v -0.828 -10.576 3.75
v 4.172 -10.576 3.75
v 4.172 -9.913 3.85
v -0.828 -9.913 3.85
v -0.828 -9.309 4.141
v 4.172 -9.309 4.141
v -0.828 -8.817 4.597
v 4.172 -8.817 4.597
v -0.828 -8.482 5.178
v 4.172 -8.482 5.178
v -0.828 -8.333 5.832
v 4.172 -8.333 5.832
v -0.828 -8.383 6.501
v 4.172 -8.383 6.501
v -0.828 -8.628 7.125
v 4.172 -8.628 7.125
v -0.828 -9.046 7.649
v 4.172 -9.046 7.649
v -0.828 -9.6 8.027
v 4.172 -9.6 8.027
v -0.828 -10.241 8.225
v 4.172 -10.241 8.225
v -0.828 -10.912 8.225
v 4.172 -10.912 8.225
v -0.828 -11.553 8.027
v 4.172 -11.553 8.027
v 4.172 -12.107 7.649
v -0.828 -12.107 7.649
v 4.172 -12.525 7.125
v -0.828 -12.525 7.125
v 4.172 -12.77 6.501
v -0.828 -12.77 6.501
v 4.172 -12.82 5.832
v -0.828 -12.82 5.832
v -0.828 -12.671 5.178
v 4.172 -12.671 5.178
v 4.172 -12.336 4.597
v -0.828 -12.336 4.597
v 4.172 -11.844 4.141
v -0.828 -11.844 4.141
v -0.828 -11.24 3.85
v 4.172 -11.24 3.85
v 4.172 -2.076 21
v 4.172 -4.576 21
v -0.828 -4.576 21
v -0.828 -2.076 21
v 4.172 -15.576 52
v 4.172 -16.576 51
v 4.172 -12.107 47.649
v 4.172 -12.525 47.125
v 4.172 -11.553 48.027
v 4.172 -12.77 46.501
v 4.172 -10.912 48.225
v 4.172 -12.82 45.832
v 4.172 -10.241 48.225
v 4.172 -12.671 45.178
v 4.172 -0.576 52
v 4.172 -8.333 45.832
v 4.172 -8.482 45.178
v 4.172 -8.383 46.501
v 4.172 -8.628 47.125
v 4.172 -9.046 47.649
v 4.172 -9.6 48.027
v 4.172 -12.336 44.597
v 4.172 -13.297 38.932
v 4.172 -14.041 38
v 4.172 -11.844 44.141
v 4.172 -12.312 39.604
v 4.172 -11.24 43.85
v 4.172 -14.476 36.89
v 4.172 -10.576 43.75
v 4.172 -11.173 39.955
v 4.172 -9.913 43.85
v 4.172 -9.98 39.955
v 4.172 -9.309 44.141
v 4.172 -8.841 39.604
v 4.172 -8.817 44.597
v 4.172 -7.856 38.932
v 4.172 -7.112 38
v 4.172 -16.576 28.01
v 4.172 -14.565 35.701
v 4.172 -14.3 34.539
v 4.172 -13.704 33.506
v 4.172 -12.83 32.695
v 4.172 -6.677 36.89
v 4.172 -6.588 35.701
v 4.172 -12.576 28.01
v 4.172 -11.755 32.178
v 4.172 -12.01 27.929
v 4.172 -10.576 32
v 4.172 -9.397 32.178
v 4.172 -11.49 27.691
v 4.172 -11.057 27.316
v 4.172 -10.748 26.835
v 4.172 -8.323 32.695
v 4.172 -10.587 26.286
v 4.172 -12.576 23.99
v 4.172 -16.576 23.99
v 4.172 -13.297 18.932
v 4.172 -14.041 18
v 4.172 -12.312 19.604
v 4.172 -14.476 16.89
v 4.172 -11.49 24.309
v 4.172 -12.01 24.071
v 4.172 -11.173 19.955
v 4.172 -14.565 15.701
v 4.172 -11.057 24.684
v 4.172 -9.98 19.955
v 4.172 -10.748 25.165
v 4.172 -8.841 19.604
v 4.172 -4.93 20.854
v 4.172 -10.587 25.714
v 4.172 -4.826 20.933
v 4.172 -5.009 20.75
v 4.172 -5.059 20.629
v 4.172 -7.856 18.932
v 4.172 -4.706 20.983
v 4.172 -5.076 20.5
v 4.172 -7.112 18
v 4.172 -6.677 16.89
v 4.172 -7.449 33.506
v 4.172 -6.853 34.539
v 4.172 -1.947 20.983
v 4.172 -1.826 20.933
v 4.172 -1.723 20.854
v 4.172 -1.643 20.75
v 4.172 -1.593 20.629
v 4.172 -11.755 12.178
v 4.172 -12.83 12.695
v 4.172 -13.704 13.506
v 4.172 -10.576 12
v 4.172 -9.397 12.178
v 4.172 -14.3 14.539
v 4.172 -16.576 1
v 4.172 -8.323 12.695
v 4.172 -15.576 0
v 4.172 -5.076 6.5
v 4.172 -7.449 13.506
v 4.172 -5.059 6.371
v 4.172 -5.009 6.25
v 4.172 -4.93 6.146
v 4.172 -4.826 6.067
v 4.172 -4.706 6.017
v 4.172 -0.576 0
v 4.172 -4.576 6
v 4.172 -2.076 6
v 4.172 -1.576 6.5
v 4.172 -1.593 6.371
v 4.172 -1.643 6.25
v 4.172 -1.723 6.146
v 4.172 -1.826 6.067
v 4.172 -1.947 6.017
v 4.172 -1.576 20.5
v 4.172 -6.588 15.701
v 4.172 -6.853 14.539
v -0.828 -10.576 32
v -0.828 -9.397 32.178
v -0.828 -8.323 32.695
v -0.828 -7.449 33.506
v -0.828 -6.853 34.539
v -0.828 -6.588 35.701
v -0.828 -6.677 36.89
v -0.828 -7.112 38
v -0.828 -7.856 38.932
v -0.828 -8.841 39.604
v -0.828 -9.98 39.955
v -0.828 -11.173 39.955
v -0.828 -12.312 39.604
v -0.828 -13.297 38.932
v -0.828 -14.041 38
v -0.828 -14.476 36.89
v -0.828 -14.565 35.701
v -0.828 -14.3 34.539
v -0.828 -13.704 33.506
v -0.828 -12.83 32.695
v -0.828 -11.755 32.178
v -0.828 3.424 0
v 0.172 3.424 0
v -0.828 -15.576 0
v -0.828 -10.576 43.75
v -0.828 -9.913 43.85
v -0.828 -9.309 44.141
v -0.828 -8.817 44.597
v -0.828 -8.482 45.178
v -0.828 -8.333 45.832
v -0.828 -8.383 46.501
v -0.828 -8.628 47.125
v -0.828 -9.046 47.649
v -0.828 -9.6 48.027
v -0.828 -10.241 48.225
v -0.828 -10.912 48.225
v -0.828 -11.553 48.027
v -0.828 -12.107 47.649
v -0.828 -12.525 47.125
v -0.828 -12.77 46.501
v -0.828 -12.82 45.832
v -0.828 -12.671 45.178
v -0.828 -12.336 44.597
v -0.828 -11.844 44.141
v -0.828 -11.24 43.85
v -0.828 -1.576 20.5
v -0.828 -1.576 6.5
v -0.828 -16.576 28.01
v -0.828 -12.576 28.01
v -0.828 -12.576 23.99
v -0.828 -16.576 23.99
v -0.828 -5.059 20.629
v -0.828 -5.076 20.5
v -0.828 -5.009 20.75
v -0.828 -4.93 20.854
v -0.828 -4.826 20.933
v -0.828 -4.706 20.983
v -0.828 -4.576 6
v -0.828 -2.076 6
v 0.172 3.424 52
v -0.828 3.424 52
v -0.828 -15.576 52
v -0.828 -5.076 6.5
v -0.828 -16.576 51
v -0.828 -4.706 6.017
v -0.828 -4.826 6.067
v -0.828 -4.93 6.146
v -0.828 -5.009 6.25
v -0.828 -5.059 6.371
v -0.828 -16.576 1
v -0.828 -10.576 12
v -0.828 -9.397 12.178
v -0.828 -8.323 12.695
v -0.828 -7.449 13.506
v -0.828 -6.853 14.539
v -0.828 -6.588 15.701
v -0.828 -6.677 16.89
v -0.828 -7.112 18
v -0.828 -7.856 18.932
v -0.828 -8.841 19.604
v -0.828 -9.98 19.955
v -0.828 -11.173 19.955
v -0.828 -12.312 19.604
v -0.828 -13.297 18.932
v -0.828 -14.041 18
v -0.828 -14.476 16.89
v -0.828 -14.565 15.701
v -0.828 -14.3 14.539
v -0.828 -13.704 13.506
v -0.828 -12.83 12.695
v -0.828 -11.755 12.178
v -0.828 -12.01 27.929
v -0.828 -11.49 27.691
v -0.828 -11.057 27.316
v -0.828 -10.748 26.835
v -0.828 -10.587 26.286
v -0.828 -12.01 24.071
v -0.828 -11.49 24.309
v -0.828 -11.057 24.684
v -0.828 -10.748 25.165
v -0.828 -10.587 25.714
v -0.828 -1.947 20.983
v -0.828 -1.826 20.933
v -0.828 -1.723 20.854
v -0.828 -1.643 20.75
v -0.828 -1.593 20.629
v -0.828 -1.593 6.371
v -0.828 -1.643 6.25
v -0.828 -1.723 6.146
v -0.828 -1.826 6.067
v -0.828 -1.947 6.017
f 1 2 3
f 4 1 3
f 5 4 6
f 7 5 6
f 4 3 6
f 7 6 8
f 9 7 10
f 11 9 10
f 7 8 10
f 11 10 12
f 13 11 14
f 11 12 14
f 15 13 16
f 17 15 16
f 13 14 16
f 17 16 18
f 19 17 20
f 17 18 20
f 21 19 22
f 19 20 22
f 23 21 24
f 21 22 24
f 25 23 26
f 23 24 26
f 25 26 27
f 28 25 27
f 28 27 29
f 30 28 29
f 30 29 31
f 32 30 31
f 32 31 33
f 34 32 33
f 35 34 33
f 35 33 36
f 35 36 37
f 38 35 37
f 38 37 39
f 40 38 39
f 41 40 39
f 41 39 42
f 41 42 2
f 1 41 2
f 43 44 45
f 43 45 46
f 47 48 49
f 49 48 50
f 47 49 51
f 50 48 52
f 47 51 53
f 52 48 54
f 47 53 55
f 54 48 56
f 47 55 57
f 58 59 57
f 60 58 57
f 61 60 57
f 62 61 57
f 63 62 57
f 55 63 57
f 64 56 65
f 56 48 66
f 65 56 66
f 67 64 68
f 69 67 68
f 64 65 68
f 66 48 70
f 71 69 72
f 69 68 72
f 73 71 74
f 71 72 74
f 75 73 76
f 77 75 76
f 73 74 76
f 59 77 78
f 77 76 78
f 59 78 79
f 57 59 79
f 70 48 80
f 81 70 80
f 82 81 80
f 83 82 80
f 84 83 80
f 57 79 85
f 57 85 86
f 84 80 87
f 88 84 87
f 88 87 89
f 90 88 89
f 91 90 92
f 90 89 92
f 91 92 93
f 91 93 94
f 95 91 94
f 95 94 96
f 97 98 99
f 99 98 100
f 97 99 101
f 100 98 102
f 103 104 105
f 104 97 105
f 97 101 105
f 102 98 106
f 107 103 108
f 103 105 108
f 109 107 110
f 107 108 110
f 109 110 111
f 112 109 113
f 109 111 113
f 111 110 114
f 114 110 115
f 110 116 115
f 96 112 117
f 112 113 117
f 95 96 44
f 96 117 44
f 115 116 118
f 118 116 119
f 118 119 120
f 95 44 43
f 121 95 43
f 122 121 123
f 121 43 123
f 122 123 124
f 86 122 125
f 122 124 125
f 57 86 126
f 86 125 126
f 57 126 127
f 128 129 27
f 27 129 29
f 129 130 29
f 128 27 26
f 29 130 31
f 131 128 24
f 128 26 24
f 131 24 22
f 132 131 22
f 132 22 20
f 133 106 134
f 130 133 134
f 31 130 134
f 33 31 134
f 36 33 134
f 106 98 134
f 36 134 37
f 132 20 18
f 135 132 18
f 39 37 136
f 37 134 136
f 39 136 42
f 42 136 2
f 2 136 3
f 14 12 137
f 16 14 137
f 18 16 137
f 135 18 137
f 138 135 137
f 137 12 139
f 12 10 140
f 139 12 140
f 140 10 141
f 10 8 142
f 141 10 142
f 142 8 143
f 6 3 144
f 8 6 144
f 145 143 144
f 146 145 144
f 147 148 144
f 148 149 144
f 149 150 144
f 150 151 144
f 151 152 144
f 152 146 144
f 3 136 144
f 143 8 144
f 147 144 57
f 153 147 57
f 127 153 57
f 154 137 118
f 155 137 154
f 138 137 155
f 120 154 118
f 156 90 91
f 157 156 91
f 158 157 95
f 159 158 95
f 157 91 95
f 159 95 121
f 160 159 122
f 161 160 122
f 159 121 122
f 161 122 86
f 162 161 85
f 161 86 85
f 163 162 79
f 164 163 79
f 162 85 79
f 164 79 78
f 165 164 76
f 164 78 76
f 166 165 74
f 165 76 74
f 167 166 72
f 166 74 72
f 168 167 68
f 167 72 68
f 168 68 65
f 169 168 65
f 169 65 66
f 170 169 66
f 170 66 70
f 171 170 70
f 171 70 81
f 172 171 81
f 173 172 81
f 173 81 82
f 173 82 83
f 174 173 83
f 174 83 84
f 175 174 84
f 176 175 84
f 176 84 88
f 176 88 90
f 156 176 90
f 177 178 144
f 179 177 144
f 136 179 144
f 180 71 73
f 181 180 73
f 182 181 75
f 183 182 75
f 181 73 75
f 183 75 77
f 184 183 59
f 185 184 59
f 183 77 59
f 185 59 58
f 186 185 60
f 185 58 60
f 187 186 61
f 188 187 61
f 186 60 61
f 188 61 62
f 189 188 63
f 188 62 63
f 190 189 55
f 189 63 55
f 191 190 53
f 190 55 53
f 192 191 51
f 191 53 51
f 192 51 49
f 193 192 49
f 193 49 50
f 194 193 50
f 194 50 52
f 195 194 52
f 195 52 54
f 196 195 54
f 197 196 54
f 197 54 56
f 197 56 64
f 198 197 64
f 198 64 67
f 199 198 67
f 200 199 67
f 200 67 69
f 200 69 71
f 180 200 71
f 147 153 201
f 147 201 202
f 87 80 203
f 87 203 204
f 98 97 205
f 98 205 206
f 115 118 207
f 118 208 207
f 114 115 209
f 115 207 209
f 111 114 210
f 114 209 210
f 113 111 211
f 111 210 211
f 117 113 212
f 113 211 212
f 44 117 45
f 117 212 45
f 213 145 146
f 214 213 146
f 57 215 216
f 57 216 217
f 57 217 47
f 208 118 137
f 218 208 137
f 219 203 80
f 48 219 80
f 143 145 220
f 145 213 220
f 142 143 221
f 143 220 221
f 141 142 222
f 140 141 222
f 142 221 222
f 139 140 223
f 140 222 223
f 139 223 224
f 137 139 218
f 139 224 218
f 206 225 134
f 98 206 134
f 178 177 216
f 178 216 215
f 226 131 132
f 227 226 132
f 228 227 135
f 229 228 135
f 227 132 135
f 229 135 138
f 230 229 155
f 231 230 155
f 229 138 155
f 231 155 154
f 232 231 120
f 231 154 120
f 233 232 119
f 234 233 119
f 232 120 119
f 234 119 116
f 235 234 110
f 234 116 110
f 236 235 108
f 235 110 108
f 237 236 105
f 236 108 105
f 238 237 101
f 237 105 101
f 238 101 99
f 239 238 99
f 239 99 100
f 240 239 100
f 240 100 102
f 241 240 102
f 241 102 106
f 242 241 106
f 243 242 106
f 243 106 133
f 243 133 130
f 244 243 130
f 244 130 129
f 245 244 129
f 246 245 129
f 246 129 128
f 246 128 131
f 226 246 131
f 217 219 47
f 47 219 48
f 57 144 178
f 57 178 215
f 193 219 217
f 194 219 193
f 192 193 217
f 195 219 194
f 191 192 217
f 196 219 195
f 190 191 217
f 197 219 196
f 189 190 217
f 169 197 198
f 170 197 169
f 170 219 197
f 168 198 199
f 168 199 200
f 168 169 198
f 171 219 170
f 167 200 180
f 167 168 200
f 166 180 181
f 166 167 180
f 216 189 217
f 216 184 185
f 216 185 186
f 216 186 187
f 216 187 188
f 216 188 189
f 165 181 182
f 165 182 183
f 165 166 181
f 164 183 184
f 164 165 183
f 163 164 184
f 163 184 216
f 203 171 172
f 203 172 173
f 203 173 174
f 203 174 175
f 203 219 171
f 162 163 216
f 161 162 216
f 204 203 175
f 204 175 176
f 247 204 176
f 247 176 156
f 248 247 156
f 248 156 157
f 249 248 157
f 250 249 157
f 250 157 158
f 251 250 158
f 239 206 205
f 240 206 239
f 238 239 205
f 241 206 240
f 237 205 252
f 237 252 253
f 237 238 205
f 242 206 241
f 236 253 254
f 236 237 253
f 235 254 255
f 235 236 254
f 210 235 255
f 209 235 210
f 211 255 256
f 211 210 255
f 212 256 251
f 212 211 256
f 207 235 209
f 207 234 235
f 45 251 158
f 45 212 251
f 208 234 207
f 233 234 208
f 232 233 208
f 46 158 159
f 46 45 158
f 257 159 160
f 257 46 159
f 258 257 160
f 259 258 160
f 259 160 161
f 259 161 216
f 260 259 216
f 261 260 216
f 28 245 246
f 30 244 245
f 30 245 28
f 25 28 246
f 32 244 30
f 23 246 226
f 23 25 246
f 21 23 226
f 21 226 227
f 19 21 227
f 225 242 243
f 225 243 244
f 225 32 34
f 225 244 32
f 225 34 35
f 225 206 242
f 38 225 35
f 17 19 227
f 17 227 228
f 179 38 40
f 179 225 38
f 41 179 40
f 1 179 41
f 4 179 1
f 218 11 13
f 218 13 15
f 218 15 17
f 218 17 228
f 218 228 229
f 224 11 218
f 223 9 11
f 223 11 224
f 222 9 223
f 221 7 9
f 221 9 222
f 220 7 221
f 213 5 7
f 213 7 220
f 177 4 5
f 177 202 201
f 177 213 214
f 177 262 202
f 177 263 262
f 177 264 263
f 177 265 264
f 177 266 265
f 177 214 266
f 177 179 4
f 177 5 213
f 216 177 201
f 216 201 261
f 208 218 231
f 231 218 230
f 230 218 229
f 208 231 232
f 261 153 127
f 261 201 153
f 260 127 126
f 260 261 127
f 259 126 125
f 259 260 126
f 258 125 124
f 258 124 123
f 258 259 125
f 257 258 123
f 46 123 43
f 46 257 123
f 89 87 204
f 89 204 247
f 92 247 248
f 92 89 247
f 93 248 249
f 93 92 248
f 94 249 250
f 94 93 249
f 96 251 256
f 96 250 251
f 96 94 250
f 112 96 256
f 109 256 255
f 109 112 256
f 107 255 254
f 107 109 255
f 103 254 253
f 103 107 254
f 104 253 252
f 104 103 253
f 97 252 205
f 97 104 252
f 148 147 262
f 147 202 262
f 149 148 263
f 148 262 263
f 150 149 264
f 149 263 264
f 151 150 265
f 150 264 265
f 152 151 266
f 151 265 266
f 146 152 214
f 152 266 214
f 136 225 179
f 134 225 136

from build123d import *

# Parameters (mm, degrees)
SKETCH1_W           = 5
SKETCH1_H           = 20
BOSS_EXTRUDE1_DEPTH = 52
SKETCH2_R           = 2.25
SKETCH2_R_2         = 4
SKETCH2_W           = 15
SKETCH2_H           = 3.5
CUT_EXTRUDE1_DEPTH  = 52
FILLET1_R           = 0.5
CHAMFER1_SIZE       = 1
CHAMFER2_SIZE       = 4


with BuildPart() as part:
    # Sketch1 → Boss-Extrude1 (new body)
    with BuildSketch(Plane.XY):
        with Locations((1.671974522, -6.576433121)):
            Rectangle(SKETCH1_W, SKETCH1_H)
    extrude(amount=BOSS_EXTRUDE1_DEPTH)

    # Sketch2 → Cut-Extrude1 (cut)
    with BuildSketch(Plane(origin=(4.171974522, 0, 0), x_dir=(0, 0, -1), z_dir=(1, 0, 0))):
        with Locations((-46, -10.576433121)):
            Circle(SKETCH2_R)
        with Locations((-36, -10.576433121)):
            Circle(SKETCH2_R_2)
        with Locations((-16, -10.576433121)):
            Circle(SKETCH2_R_2)
        with Locations((-6, -10.576433121)):
            Circle(SKETCH2_R)
        with BuildLine():
            Line((-23.99, -16.576433121), (-28.01, -16.576433121))
            Line((-28.01, -16.576433121), (-28.01, -12.576433121))
            ThreePointArc((-28.01, -12.576433121), (-26, -10.566433121), (-23.99, -12.576433121))
            Line((-23.99, -12.576433121), (-23.99, -16.576433121))
        make_face()
        with Locations((-13.5, -3.326433121)):
            Rectangle(SKETCH2_W, SKETCH2_H)
    extrude(amount=-CUT_EXTRUDE1_DEPTH, mode=Mode.SUBTRACT)

    # Fillet1
    fillet1_edges = [part.edges().sort_by_distance(p)[0] for p in [
        (1.671974522, -5.076433121, 21),
        (1.671974522, -1.576433121, 21),
        (1.671974522, -1.576433121, 6),
        (1.671974522, -5.076433121, 6),
    ]]
    fillet(fillet1_edges, radius=FILLET1_R)

    # Chamfer1
    chamfer1_edges = [part.edges().sort_by_distance(p)[0] for p in [
        (1.671974522, -16.576433121, 0),
        (1.671974522, -16.576433121, 52),
    ]]
    chamfer(chamfer1_edges, length=CHAMFER1_SIZE)

    # Chamfer2
    chamfer2_edges = [part.edges().sort_by_distance(p)[0] for p in [
        (4.171974522, 3.423566879, 26),
    ]]
    chamfer(chamfer2_edges, length=CHAMFER2_SIZE)


solid = part.part
